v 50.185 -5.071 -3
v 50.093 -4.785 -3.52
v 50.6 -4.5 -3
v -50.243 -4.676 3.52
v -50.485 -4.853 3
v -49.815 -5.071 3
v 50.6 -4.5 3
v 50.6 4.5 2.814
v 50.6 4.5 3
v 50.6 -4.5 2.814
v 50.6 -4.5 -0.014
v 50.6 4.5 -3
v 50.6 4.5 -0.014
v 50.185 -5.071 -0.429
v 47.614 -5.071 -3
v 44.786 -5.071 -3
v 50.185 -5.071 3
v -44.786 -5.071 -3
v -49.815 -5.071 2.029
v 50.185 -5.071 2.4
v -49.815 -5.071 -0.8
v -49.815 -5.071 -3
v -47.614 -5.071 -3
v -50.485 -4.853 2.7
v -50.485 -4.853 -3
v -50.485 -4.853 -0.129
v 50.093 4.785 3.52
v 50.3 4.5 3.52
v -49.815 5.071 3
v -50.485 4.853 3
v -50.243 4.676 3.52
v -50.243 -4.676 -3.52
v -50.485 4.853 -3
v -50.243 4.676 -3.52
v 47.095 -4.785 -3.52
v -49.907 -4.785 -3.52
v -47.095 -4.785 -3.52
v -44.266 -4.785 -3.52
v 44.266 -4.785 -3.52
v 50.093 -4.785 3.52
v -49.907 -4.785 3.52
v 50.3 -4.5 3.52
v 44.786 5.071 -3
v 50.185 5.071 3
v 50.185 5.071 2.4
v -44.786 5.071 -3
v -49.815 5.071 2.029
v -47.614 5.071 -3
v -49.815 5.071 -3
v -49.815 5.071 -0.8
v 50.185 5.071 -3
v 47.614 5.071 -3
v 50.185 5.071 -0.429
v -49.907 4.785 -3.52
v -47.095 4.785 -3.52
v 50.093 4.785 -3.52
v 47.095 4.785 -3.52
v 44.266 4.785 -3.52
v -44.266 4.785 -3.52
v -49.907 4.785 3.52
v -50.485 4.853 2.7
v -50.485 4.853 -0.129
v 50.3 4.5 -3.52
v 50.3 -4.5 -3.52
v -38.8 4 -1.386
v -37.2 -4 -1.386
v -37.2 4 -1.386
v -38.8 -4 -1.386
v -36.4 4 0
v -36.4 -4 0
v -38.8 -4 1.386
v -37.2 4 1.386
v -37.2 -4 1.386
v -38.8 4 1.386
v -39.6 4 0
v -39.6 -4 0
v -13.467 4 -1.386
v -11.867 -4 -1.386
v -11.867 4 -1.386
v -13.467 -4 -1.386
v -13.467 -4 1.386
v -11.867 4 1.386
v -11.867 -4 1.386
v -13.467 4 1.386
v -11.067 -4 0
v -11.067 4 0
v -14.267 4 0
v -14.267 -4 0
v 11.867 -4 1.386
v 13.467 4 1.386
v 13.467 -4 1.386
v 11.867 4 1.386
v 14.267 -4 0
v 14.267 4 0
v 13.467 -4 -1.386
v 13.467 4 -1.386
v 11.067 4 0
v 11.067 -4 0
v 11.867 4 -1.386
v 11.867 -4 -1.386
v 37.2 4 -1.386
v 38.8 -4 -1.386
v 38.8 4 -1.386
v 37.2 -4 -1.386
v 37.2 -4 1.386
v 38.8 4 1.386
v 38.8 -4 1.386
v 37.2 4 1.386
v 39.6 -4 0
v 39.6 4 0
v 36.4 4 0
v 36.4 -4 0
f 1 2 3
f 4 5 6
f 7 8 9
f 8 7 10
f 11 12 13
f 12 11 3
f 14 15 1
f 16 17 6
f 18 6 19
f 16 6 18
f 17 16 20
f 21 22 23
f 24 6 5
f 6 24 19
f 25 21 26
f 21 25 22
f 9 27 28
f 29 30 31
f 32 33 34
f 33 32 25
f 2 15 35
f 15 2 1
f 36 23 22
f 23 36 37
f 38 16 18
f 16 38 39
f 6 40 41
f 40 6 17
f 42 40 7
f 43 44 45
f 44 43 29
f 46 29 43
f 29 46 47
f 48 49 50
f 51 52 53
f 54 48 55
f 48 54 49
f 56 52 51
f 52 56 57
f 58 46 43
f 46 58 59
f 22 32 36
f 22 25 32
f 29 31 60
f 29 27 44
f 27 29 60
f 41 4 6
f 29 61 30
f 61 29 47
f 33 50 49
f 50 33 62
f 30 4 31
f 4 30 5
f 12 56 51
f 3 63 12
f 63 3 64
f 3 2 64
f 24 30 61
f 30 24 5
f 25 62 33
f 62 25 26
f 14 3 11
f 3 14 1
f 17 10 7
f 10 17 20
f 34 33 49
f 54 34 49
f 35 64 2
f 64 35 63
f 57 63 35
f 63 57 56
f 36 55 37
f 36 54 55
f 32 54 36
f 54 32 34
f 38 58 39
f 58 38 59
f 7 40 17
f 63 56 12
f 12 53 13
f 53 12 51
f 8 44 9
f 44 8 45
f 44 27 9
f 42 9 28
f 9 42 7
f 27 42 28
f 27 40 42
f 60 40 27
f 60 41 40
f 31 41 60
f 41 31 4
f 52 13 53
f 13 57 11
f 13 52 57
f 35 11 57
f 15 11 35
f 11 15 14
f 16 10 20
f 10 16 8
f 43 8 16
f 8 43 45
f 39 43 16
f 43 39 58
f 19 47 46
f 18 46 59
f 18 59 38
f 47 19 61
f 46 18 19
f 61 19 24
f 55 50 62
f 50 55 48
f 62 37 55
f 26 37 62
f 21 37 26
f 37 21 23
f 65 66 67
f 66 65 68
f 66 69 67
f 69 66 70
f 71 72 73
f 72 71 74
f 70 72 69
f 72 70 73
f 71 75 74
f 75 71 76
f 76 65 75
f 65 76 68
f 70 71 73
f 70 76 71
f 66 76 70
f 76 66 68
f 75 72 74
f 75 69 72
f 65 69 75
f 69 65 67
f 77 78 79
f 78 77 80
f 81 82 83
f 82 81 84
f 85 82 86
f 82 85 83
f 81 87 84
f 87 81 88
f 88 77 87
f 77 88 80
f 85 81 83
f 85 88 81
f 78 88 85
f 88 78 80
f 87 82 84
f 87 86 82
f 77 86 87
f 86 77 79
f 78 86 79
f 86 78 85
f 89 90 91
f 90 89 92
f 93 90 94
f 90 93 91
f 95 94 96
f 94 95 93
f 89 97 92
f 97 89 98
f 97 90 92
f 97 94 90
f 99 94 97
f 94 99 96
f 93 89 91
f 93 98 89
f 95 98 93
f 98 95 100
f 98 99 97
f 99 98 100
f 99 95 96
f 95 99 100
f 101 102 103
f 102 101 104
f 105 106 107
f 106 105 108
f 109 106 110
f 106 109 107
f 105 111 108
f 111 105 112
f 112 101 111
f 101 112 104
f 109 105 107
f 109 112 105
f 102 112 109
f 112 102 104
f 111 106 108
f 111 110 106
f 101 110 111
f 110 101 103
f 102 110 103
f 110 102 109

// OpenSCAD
// Parameters
rail_L = 100.0; //[50.0:200.0:1]
rail_W = 9.0; //[4.5:18.0:0.1]
rail_H = 6.0; //[3.0:12.0:0.1]
hole_d = 3.2; //[2.0:6.0:0.1]
hole_count = 4; //[2:8:1]
end_margin = 12.0; //[6.0:24.0:0.5]
chamfer_L = 1.0; //[0.5:3.0:0.1]
fillet_r = 0.6; //[0.2:2.0:0.1]
minkowski_eps = 0.2; //[0.05:0.6:0.05]
hole_clearance_h = 2.0; //[1.0:6.0:0.5]

// Base Shapes
module rail_body_raw() {
  cube([rail_L, rail_W, rail_H], center=true);
}

module fillet_sphere() {
  sphere(r=fillet_r, center=true);
}

module chamfer_cut() {
  cube([chamfer_L*2, rail_W*2, rail_H*2], center=true);
}

module mount_hole_cyl() {
  rotate([90, 0, 0])
    cylinder(h=rail_H + hole_clearance_h, r=hole_d/2, center=true);
}

// Operations
module rail_body_fillet_minkowski() {
  minkowski() {
    rail_body_raw();
    fillet_sphere();
  }
}

module chamfer_cut_pos_tx() {
  translate([rail_L/2 - chamfer_L + minkowski_eps, 0, 0])
    rotate([0, 45, 0]) chamfer_cut();
}

module chamfer_cut_neg_tx() {
  translate([-(rail_L/2 - chamfer_L + minkowski_eps), 0, 0])
    rotate([0, -45, 0]) chamfer_cut();
}

module rail_with_end_chamfers() {
  difference() {
    rail_body_fillet_minkowski();
    chamfer_cut_pos_tx();
    chamfer_cut_neg_tx();
  }
}

module mounting_holes_union() {
  union() {
    translate([-(rail_L/2 - end_margin), 0, 0]) mount_hole_cyl();
    translate([-(rail_L/2 - end_margin) + (rail_L - 2*end_margin)/3, 0, 0]) mount_hole_cyl();
    translate([-(rail_L/2 - end_margin) + 2*(rail_L - 2*end_margin)/3, 0, 0]) mount_hole_cyl();
    translate([rail_L/2 - end_margin, 0, 0]) mount_hole_cyl();
  }
}

// Final Output
difference() {
  rail_with_end_chamfers();
  mounting_holes_union();
}
